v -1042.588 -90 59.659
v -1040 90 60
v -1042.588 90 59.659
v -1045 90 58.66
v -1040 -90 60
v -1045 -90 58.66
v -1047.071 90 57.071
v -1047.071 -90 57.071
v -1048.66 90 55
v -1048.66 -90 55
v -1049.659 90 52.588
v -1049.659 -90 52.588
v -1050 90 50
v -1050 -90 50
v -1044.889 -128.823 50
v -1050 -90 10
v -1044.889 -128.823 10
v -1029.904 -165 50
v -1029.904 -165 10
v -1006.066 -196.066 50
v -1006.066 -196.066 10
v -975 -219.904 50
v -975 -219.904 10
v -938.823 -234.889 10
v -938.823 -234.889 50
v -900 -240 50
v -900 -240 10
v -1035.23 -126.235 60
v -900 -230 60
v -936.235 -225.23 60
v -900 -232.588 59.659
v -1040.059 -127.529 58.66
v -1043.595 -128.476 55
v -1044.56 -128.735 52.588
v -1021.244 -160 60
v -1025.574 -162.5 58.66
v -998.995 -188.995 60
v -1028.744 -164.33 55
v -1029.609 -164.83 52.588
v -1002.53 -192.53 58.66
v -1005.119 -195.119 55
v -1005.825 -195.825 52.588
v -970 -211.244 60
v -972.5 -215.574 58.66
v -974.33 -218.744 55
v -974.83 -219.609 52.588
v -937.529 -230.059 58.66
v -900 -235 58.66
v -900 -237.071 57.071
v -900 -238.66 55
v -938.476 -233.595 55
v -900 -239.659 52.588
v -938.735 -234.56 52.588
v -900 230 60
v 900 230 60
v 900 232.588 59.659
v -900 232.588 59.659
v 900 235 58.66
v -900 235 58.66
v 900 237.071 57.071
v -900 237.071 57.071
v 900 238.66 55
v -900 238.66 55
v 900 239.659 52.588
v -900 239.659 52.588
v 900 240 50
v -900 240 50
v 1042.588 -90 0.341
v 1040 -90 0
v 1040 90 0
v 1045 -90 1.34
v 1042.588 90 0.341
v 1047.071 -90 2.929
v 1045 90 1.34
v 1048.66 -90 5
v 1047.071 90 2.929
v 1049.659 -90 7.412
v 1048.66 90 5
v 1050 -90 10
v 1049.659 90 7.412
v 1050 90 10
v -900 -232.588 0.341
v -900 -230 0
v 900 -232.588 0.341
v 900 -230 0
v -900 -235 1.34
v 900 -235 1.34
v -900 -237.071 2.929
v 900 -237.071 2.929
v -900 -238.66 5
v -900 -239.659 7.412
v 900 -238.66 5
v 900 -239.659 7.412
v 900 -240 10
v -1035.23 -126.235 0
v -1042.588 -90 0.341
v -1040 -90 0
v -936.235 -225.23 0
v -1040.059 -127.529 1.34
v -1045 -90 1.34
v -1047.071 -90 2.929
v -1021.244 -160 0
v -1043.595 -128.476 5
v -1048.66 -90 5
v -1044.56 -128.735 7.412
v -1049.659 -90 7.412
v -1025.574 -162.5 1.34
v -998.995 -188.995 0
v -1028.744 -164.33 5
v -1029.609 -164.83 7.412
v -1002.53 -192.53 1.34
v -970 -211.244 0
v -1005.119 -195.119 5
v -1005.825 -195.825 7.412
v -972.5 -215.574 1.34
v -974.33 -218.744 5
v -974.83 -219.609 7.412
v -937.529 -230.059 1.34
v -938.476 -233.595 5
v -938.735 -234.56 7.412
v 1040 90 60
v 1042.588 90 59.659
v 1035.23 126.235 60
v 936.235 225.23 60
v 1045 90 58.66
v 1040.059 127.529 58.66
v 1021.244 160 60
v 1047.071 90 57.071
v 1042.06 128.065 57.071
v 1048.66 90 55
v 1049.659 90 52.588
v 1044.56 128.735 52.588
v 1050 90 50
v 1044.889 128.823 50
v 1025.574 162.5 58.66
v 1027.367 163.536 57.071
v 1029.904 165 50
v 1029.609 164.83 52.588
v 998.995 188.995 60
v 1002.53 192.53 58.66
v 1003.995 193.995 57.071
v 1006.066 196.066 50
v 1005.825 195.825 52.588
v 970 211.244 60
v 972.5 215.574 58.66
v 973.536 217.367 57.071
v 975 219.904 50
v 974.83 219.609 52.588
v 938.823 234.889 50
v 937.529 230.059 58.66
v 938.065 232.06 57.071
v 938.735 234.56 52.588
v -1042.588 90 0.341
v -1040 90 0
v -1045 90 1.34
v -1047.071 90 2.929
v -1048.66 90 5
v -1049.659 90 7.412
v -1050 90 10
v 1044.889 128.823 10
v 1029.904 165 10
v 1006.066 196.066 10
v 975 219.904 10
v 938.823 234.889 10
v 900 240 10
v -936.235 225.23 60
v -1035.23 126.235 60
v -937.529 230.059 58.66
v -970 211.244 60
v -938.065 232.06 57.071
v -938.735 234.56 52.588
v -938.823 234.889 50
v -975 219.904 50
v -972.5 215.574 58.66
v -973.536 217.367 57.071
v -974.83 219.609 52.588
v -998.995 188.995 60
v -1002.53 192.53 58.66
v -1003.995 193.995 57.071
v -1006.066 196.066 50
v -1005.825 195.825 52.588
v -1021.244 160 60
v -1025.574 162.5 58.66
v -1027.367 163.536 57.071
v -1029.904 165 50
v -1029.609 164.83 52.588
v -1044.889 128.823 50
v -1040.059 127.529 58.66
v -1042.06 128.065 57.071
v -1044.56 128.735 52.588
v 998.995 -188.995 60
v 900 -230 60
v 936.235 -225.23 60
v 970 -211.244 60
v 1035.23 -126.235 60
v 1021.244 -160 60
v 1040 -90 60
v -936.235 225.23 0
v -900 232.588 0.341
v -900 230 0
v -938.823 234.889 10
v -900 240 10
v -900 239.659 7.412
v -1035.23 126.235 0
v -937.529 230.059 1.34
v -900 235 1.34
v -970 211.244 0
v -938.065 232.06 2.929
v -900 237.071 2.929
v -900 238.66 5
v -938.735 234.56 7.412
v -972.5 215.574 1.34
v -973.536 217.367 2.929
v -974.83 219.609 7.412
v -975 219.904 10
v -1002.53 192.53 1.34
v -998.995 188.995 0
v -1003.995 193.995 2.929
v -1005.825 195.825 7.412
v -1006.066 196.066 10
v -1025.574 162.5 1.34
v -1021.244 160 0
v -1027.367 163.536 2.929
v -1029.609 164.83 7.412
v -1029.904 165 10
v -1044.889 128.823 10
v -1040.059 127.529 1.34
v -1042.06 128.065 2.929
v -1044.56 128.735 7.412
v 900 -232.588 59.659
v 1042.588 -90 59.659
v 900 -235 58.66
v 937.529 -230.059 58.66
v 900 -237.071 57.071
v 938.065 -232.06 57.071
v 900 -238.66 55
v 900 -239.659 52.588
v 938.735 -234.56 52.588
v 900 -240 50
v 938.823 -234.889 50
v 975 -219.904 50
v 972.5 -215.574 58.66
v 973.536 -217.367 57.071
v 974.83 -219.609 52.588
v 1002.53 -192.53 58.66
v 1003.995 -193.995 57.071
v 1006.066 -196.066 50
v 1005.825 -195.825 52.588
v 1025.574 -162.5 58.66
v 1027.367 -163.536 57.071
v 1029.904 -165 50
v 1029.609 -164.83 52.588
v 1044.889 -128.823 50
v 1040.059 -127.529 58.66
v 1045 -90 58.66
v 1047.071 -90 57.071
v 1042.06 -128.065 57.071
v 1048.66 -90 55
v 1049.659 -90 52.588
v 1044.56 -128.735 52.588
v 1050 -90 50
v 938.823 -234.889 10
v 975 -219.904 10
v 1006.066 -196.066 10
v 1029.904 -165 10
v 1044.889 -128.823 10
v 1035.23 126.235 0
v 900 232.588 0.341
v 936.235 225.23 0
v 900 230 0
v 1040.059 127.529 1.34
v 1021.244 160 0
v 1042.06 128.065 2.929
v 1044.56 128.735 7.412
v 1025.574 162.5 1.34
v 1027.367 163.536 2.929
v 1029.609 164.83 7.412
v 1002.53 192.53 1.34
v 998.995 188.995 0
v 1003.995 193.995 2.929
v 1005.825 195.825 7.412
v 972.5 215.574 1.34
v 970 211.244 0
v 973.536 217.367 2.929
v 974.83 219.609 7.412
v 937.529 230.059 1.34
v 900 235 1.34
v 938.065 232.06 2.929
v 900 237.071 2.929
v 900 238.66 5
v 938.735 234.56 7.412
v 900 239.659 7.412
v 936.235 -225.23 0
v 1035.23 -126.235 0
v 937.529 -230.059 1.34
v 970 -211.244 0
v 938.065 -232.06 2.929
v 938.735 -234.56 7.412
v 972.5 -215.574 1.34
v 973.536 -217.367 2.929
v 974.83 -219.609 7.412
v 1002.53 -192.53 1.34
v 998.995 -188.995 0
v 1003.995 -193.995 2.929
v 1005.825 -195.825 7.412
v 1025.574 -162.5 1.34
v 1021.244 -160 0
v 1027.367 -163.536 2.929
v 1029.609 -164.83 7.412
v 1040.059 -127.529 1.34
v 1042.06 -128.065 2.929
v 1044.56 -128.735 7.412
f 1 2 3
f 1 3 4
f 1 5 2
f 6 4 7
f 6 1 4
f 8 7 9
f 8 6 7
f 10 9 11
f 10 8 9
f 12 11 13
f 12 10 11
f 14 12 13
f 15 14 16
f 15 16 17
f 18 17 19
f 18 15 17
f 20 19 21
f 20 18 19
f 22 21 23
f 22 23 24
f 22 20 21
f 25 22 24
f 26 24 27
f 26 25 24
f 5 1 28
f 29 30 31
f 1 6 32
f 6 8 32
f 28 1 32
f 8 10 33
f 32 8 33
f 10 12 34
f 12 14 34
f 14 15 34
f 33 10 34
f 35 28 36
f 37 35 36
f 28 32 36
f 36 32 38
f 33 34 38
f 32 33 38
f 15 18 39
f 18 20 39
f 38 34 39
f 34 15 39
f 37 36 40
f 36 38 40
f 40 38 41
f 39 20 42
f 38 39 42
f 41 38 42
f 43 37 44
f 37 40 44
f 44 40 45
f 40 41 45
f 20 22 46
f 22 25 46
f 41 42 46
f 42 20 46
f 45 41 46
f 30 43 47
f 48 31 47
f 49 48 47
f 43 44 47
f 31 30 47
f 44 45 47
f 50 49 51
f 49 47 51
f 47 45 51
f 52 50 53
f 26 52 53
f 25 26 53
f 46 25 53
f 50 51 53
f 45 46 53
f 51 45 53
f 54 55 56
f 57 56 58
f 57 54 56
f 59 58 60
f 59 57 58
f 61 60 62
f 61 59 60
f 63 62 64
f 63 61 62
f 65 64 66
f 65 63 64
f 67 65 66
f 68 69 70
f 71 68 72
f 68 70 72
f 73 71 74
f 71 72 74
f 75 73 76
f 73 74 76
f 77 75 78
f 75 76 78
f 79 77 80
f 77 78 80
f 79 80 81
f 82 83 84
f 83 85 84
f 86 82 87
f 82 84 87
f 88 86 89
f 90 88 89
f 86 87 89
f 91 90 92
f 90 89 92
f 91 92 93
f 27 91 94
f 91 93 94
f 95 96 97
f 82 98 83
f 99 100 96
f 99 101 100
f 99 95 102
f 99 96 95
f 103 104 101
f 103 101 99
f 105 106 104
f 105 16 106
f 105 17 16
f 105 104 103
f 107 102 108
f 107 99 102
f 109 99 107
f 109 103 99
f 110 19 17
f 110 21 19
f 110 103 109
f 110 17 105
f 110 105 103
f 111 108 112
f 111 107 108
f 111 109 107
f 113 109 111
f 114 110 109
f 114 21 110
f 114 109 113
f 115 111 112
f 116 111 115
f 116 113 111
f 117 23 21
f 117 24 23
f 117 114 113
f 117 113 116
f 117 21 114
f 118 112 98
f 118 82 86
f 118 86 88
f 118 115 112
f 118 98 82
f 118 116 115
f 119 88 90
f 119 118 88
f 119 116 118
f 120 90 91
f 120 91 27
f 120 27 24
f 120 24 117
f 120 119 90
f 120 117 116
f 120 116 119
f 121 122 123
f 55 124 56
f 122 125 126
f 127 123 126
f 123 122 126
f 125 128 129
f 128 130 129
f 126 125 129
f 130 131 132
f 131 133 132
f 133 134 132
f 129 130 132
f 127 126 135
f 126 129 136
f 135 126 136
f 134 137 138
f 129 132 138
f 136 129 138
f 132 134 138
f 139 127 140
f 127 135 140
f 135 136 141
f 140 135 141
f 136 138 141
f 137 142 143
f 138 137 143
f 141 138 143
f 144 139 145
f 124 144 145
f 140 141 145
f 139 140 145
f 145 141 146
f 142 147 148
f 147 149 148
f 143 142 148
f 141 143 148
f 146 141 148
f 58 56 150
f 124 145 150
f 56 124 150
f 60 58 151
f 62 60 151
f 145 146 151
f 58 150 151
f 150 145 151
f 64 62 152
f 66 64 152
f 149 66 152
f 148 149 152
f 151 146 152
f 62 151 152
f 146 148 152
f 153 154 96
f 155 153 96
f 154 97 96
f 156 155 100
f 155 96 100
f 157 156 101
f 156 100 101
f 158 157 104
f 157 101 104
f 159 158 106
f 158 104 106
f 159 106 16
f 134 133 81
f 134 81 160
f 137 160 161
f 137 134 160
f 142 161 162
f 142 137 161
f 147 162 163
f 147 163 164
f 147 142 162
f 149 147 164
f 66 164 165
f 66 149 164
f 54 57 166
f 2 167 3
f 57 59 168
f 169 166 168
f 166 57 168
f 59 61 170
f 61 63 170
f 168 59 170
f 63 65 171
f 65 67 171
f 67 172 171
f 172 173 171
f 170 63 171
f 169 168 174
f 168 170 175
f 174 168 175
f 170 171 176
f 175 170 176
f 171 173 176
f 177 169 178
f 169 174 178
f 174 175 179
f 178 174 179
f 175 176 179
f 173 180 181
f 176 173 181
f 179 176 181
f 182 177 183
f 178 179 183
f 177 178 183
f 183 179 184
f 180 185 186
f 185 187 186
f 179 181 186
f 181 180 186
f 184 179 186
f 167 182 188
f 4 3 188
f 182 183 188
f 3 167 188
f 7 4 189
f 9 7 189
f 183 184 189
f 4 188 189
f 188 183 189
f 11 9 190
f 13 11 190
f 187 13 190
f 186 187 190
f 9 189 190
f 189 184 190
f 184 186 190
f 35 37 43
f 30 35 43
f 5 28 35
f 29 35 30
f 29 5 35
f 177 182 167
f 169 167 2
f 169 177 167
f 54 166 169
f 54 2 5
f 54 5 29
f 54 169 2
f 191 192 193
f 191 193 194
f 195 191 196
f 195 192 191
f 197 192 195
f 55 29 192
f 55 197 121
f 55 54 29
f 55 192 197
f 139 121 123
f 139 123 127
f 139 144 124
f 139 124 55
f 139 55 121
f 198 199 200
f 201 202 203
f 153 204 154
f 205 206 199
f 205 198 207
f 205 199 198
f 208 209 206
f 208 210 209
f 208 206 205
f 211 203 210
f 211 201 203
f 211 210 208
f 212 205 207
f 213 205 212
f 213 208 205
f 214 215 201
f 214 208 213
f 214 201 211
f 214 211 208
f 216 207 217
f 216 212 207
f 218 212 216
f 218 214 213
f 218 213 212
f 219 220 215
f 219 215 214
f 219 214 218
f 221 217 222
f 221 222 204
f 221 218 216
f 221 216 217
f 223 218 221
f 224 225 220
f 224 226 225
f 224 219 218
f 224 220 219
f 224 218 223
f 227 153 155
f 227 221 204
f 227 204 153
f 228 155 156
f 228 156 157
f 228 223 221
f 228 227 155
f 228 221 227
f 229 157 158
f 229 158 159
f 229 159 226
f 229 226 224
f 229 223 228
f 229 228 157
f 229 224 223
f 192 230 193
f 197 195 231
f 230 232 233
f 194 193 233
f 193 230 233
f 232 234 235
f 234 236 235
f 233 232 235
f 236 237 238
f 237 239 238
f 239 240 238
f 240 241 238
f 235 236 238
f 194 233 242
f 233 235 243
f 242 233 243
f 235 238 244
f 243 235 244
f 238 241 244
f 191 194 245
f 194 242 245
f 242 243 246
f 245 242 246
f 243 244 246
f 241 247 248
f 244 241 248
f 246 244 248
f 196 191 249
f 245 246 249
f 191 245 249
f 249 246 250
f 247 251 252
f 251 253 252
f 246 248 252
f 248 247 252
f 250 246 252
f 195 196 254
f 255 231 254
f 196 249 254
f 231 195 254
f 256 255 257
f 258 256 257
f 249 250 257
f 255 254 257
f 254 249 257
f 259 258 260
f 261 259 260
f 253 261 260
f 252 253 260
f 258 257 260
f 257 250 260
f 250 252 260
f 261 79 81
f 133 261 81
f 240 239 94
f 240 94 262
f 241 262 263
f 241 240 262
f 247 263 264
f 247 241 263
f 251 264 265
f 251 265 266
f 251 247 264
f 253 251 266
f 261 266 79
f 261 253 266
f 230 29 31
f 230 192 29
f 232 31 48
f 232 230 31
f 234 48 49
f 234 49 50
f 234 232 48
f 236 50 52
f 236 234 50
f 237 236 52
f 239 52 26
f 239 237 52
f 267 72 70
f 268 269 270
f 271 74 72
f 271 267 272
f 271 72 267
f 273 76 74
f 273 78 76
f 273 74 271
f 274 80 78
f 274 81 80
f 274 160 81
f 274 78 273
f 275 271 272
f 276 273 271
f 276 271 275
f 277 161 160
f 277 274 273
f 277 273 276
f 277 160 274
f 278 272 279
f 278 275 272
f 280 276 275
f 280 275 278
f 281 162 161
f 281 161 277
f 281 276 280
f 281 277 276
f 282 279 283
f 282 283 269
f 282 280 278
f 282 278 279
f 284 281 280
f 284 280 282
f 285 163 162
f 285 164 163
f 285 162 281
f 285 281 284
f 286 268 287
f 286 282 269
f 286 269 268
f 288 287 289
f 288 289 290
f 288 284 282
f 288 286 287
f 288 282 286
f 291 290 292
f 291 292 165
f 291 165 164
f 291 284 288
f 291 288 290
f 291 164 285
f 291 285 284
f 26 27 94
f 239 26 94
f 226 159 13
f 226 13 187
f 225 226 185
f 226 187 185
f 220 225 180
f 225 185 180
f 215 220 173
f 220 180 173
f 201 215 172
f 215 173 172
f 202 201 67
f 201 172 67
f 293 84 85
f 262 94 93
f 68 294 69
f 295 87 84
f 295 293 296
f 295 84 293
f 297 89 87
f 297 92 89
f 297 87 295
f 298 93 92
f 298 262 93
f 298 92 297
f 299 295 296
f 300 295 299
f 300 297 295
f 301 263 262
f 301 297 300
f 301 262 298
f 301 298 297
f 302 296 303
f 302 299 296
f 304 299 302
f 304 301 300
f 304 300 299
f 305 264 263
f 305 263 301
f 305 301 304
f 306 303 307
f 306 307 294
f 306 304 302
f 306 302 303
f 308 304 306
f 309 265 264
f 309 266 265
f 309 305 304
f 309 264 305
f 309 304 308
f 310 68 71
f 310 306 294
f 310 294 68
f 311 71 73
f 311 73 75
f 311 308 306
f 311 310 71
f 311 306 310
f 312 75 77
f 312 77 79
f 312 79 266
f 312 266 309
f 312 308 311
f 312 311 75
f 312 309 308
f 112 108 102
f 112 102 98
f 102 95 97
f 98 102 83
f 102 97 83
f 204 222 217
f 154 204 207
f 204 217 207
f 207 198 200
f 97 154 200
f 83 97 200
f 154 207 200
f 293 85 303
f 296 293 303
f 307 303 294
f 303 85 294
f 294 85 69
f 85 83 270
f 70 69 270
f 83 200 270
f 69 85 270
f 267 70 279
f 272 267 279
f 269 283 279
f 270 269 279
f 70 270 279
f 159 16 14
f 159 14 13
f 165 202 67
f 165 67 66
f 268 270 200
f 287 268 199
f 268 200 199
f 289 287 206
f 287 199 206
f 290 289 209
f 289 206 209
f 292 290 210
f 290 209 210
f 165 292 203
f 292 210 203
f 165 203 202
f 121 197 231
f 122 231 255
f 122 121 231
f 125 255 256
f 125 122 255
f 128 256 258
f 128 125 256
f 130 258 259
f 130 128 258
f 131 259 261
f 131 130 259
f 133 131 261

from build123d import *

# Parameters (mm, degrees)
F0_W     = 2100
F0_H     = 480
F1_DEPTH = 60
F2_R     = 150
F3_R     = 10


with BuildPart() as f1:
    # F0 (on Top) → F1 (new body)
    with BuildSketch(Plane.XY):
        Rectangle(F0_W, F0_H)
    extrude(amount=F1_DEPTH)

    # F2
    f2_edges = [f1.edges().sort_by_distance(p)[0] for p in [
        (-1050, -240, 30),
        (-1050, 240, 30),
        (1050, -240, 30),
        (1050, 240, 30),
    ]]
    fillet(f2_edges, radius=F2_R)

    # F3
    f3_edges = [f1.edges().sort_by_distance(p)[0] for p in [
        (0, -240, 60),
        (0, -240, 0),
    ]]
    fillet(f3_edges, radius=F3_R)


solid = f1.part
